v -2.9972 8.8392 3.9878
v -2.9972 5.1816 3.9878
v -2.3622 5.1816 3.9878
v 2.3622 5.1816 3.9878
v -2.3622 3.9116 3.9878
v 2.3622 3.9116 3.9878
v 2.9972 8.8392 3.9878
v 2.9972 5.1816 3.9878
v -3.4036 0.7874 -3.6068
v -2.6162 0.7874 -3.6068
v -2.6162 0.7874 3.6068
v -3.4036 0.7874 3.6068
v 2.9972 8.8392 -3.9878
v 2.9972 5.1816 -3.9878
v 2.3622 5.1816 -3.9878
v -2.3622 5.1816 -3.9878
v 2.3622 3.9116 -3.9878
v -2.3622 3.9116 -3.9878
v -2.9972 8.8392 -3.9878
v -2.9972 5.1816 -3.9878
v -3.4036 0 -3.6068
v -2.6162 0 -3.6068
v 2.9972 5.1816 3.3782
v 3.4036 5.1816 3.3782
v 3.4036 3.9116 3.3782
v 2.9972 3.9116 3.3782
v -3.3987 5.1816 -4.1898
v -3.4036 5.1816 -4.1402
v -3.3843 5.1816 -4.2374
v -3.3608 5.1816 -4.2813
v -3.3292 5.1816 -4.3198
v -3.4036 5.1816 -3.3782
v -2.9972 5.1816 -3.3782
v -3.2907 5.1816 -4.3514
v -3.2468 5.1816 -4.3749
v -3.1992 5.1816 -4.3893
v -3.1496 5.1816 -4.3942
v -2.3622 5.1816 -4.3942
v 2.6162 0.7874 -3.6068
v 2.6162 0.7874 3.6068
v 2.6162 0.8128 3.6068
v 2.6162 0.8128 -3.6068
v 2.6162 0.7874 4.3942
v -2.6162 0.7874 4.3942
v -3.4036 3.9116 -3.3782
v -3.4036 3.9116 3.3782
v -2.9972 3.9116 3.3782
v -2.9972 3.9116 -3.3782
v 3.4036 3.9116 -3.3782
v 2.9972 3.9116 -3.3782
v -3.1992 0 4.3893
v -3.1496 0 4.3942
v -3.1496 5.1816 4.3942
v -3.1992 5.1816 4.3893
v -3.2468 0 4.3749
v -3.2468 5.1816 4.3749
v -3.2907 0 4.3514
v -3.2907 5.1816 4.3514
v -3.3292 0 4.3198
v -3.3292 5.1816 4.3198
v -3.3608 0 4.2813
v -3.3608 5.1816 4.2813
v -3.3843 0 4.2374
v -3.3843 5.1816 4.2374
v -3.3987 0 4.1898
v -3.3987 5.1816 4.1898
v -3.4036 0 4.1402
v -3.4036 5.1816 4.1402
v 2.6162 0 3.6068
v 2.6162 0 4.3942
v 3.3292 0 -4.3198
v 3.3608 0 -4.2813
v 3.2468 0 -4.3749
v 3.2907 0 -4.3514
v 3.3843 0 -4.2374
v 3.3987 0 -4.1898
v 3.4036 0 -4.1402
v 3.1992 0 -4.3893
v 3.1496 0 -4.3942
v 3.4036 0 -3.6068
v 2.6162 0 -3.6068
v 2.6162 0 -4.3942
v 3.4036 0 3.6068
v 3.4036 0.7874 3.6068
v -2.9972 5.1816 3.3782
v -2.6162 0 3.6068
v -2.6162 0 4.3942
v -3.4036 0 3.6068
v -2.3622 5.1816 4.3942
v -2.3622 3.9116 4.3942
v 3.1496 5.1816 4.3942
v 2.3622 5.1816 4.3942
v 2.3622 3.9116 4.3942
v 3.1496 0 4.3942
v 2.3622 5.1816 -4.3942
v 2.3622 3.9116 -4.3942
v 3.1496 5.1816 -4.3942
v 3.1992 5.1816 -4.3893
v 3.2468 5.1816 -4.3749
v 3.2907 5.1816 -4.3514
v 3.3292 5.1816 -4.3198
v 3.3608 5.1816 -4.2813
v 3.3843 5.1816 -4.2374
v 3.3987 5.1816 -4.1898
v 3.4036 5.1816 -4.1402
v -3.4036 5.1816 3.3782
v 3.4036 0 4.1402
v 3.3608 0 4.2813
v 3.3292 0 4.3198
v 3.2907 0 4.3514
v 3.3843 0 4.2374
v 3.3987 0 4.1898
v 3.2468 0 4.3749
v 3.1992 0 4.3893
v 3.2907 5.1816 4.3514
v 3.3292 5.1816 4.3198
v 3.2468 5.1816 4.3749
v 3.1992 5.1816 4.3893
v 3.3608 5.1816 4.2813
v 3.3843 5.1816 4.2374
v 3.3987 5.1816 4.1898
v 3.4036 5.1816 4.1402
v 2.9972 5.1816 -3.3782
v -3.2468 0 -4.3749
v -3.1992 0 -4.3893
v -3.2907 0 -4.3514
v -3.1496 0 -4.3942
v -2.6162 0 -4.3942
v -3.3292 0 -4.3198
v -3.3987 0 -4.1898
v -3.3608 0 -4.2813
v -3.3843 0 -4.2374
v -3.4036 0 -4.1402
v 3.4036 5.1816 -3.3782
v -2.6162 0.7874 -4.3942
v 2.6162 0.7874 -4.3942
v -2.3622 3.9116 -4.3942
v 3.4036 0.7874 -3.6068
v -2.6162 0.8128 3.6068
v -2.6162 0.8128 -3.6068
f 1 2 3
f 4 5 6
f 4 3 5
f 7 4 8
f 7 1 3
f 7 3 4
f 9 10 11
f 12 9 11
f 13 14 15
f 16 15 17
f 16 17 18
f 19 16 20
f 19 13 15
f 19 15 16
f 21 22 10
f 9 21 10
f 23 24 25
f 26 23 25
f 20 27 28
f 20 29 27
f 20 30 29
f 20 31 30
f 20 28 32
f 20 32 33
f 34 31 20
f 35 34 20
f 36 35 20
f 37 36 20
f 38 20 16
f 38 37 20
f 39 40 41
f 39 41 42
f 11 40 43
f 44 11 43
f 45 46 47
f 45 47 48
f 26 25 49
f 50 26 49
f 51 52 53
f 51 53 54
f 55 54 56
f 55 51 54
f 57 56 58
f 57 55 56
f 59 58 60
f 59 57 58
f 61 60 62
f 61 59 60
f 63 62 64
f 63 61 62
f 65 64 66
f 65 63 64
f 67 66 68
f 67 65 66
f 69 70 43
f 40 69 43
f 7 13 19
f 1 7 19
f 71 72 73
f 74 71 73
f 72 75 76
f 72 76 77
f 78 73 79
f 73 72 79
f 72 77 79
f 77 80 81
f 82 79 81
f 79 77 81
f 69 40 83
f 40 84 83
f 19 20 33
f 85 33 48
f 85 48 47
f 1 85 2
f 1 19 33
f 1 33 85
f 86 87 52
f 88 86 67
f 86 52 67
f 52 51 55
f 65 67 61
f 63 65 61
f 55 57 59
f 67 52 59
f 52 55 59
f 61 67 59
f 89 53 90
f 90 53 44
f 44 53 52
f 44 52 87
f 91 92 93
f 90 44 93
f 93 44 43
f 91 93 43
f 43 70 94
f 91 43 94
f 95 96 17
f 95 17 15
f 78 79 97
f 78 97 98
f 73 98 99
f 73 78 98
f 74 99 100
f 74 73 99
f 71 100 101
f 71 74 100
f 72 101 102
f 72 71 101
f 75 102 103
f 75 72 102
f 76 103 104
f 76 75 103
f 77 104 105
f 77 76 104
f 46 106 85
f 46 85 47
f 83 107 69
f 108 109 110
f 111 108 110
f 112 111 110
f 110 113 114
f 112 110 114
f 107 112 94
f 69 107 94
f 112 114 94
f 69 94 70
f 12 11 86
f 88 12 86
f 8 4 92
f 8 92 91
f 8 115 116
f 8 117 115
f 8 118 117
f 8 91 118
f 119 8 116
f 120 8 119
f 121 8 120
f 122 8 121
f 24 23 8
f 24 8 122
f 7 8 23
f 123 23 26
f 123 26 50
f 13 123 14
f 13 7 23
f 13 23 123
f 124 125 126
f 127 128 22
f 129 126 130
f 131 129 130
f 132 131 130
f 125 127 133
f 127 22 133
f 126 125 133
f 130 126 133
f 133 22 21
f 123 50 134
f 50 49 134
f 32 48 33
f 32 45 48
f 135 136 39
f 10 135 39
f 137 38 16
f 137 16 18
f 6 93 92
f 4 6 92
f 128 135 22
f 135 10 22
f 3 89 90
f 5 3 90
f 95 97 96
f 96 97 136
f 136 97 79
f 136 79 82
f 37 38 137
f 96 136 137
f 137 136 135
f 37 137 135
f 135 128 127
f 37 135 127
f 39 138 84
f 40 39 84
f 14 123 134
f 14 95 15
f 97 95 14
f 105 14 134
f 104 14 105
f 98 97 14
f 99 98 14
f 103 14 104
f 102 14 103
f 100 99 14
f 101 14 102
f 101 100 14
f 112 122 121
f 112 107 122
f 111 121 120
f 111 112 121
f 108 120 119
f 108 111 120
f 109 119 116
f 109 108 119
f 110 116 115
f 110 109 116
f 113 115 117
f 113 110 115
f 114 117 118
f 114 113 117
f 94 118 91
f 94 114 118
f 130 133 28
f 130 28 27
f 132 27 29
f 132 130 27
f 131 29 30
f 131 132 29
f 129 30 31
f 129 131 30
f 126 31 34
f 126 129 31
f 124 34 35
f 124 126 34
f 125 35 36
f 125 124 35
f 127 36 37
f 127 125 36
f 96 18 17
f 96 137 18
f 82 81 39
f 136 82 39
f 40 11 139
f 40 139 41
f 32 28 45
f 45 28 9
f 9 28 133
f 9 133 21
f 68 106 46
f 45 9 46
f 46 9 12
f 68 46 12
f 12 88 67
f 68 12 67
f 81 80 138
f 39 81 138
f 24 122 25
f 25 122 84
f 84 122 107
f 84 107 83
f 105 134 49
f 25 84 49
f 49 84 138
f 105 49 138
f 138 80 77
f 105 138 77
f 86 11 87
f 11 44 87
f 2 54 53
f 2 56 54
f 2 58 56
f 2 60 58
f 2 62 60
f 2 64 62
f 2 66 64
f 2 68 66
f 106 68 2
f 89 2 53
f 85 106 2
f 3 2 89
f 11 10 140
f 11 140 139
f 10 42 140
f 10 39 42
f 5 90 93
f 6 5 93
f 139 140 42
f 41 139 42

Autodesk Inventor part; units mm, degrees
sketch "Sketch_1" plane through (0, 0, 0) normal (0, 1, 0) x (-1, 0, 0)
  line L0 (3.4036, -4.1402) -> (3.4036, 4.1402)
  arc A0 (3.4036, 4.1402) -> (3.1496, 4.3942) centre (3.1496, 4.1402) ccw
  line L1 (3.1496, 4.3942) -> (-3.1496, 4.3942)
  arc A1 (-3.1496, 4.3942) -> (-3.4036, 4.1402) centre (-3.1496, 4.1402) ccw
  line L2 (-3.4036, 4.1402) -> (-3.4036, -4.1402)
  arc A2 (-3.4036, -4.1402) -> (-3.1496, -4.3942) centre (-3.1496, -4.1402) ccw
  line L3 (-3.1496, -4.3942) -> (3.1496, -4.3942)
  arc A3 (3.1496, -4.3942) -> (3.4036, -4.1402) centre (3.1496, -4.1402) ccw
extrude "Extrusion1" add sketch "Sketch_1" along normal blind 8.8392
sketch "Sketch_2" plane through (0, 8.8392, 0) normal (0, 1, 0) x (1, 0, 0)
  line L0 (-7.3539, 7.1515) -> (-7.3539, -8.5008)
  line L1 (-7.3539, -8.5008) -> (8.5233, -8.5008)
  line L2 (8.5233, -8.5008) -> (8.5233, 7.1515)
  line L3 (8.5233, 7.1515) -> (-7.3539, 7.1515)
  line L4 (-2.9972, -3.9878) -> (2.9972, -3.9878)
  line L5 (2.9972, -3.9878) -> (2.9972, 3.9878)
  line L6 (2.9972, 3.9878) -> (-2.9972, 3.9878)
  line L7 (-2.9972, 3.9878) -> (-2.9972, -3.9878)
extrude "Extrusion2" cut sketch "Sketch_2" against normal blind 3.6576
sketch "Sketch_3" plane through (3.4036, 0, 0) normal (1, 0, 0) x (0, 0, -1)
  line L0 (-3.6068, 0) -> (3.6068, 0)
  line L1 (3.6068, 0) -> (3.6068, 0.7874)
  line L2 (3.6068, 0.7874) -> (-3.6068, 0.7874)
  line L3 (-3.6068, 0.7874) -> (-3.6068, 0)
extrude "Extrusion3" cut sketch "Sketch_3" against normal blind 6.8072
sketch "Sketch_4" plane through (0, 0, 4.3942) normal (0, 0, 1) x (1, 0, 0)
  line L0 (-2.6162, 0) -> (2.6162, 0)
  line L1 (2.6162, 0) -> (2.6162, 0.7874)
  line L2 (2.6162, 0.7874) -> (-2.6162, 0.7874)
  line L3 (-2.6162, 0.7874) -> (-2.6162, 0)
extrude "Extrusion4" cut sketch "Sketch_4" against normal blind 8.7884
sketch "Sketch_5" plane through (3.4036, 0, 0) normal (1, 0, 0) x (0, 0, -1)
  line L0 (-3.3782, 5.1816) -> (-3.3782, 3.9116)
  line L1 (-3.3782, 3.9116) -> (3.3782, 3.9116)
  line L2 (3.3782, 3.9116) -> (3.3782, 5.1816)
  line L3 (3.3782, 5.1816) -> (-3.3782, 5.1816)
extrude "Extrusion5" cut sketch "Sketch_5" against normal blind 0.4064
sketch "Sketch_6" plane through (-3.4036, 0, 0) normal (1, 0, 0) x (0, 0, -1)
  line L0 (-3.3782, 5.1816) -> (-3.3782, 3.9116)
  line L1 (-3.3782, 3.9116) -> (3.3782, 3.9116)
  line L2 (3.3782, 3.9116) -> (3.3782, 5.1816)
  line L3 (3.3782, 5.1816) -> (-3.3782, 5.1816)
extrude "Extrusion6" cut sketch "Sketch_6" along normal blind 0.4064
sketch "Sketch_7" plane through (0, 0, 4.3942) normal (0, 0, 1) x (1, 0, 0)
  line L0 (-2.3622, 5.1816) -> (-2.3622, 3.9116)
  line L1 (-2.3622, 3.9116) -> (2.3622, 3.9116)
  line L2 (2.3622, 3.9116) -> (2.3622, 5.1816)
  line L3 (2.3622, 5.1816) -> (-2.3622, 5.1816)
extrude "Extrusion7" cut sketch "Sketch_7" against normal blind 0.4064
sketch "Sketch_8" plane through (0, 0, -4.3942) normal (0, 0, 1) x (1, 0, 0)
  line L0 (-2.3622, 5.1816) -> (-2.3622, 3.9116)
  line L1 (-2.3622, 3.9116) -> (2.3622, 3.9116)
  line L2 (2.3622, 3.9116) -> (2.3622, 5.1816)
  line L3 (2.3622, 5.1816) -> (-2.3622, 5.1816)
extrude "Extrusion8" cut sketch "Sketch_8" along normal blind 0.4064
sketch "Sketch_49" plane through (0, 0.7874, 0) normal (0, 1, 0) x (1, 0, 0)
  line L0 (-2.6162, -3.6068) -> (2.6162, -3.6068)
  line L1 (2.6162, -3.6068) -> (2.6162, 3.6068)
  line L2 (2.6162, 3.6068) -> (-2.6162, 3.6068)
  line L3 (-2.6162, 3.6068) -> (-2.6162, -3.6068)
extrude "Extrusion9" cut sketch "Sketch_49" along normal blind 0.0254
ref_plane "black_body_str_XY" through (0, 8.8392, 0) normal (0, -1, 0) x (1, 0, 0)
ref_plane "black_body_str_YZ" through (0, 8.8392, 0) normal (1, 0, 0) x (0, 0, 1)
ref_plane "black_body_str_ZX" through (0, 8.8392, 0) normal (0, 0, 1) x (0, -1, 0)
ref_plane "black_body_ver_rigang_XY" through (0, 0, 9.0678) normal (0, 0, -1) x (1, 0, 0)
ref_plane "black_body_ver_rigang_YZ" through (0, 0, 9.0678) normal (1, 0, 0) x (0, -1, 0)
ref_plane "black_body_ver_rigang_ZX" through (0, 0, 9.0678) normal (0, -1, 0) x (0, 0, -1)
ref_plane "dummy_righ_vert_XY" through (0, 0, 0) normal (0, 0, -1) x (1, 0, 0)
ref_plane "dummy_righ_vert_YZ" through (0, 0, 0) normal (1, 0, 0) x (0, -1, 0)
ref_plane "dummy_righ_vert_ZX" through (0, 0, 0) normal (0, -1, 0) x (0, 0, -1)
ref_plane "dummy_straight_XY" through (0, 0, 0) normal (0, -1, 0) x (1, 0, 0)
ref_plane "dummy_straight_YZ" through (0, 0, 0) normal (1, 0, 0) x (0, 0, 1)
ref_plane "dummy_straight_ZX" through (0, 0, 0) normal (0, 0, 1) x (0, -1, 0)
ref_plane "rigang_vert_trmnls_XY" through (0, 0, 0.8636) normal (0, 0, 1) x (1, 0, 0)
ref_plane "rigang_vert_trmnls_YZ" through (0, 0, 0.8636) normal (1, 0, 0) x (0, 1, 0)
ref_plane "rigang_vert_trmnls_ZX" through (0, 0, 0.8636) normal (0, 1, 0) x (0, 0, 1)
ref_plane "str_trmnls_XY" through (0, 0.8636, 0) normal (0, 1, 0) x (1, 0, 0)
ref_plane "str_trmnls_YZ" through (0, 0.8636, 0) normal (1, 0, 0) x (0, 0, -1)
ref_plane "str_trmnls_ZX" through (0, 0.8636, 0) normal (0, 0, -1) x (0, 1, 0)
properties part number "B12APbody"
